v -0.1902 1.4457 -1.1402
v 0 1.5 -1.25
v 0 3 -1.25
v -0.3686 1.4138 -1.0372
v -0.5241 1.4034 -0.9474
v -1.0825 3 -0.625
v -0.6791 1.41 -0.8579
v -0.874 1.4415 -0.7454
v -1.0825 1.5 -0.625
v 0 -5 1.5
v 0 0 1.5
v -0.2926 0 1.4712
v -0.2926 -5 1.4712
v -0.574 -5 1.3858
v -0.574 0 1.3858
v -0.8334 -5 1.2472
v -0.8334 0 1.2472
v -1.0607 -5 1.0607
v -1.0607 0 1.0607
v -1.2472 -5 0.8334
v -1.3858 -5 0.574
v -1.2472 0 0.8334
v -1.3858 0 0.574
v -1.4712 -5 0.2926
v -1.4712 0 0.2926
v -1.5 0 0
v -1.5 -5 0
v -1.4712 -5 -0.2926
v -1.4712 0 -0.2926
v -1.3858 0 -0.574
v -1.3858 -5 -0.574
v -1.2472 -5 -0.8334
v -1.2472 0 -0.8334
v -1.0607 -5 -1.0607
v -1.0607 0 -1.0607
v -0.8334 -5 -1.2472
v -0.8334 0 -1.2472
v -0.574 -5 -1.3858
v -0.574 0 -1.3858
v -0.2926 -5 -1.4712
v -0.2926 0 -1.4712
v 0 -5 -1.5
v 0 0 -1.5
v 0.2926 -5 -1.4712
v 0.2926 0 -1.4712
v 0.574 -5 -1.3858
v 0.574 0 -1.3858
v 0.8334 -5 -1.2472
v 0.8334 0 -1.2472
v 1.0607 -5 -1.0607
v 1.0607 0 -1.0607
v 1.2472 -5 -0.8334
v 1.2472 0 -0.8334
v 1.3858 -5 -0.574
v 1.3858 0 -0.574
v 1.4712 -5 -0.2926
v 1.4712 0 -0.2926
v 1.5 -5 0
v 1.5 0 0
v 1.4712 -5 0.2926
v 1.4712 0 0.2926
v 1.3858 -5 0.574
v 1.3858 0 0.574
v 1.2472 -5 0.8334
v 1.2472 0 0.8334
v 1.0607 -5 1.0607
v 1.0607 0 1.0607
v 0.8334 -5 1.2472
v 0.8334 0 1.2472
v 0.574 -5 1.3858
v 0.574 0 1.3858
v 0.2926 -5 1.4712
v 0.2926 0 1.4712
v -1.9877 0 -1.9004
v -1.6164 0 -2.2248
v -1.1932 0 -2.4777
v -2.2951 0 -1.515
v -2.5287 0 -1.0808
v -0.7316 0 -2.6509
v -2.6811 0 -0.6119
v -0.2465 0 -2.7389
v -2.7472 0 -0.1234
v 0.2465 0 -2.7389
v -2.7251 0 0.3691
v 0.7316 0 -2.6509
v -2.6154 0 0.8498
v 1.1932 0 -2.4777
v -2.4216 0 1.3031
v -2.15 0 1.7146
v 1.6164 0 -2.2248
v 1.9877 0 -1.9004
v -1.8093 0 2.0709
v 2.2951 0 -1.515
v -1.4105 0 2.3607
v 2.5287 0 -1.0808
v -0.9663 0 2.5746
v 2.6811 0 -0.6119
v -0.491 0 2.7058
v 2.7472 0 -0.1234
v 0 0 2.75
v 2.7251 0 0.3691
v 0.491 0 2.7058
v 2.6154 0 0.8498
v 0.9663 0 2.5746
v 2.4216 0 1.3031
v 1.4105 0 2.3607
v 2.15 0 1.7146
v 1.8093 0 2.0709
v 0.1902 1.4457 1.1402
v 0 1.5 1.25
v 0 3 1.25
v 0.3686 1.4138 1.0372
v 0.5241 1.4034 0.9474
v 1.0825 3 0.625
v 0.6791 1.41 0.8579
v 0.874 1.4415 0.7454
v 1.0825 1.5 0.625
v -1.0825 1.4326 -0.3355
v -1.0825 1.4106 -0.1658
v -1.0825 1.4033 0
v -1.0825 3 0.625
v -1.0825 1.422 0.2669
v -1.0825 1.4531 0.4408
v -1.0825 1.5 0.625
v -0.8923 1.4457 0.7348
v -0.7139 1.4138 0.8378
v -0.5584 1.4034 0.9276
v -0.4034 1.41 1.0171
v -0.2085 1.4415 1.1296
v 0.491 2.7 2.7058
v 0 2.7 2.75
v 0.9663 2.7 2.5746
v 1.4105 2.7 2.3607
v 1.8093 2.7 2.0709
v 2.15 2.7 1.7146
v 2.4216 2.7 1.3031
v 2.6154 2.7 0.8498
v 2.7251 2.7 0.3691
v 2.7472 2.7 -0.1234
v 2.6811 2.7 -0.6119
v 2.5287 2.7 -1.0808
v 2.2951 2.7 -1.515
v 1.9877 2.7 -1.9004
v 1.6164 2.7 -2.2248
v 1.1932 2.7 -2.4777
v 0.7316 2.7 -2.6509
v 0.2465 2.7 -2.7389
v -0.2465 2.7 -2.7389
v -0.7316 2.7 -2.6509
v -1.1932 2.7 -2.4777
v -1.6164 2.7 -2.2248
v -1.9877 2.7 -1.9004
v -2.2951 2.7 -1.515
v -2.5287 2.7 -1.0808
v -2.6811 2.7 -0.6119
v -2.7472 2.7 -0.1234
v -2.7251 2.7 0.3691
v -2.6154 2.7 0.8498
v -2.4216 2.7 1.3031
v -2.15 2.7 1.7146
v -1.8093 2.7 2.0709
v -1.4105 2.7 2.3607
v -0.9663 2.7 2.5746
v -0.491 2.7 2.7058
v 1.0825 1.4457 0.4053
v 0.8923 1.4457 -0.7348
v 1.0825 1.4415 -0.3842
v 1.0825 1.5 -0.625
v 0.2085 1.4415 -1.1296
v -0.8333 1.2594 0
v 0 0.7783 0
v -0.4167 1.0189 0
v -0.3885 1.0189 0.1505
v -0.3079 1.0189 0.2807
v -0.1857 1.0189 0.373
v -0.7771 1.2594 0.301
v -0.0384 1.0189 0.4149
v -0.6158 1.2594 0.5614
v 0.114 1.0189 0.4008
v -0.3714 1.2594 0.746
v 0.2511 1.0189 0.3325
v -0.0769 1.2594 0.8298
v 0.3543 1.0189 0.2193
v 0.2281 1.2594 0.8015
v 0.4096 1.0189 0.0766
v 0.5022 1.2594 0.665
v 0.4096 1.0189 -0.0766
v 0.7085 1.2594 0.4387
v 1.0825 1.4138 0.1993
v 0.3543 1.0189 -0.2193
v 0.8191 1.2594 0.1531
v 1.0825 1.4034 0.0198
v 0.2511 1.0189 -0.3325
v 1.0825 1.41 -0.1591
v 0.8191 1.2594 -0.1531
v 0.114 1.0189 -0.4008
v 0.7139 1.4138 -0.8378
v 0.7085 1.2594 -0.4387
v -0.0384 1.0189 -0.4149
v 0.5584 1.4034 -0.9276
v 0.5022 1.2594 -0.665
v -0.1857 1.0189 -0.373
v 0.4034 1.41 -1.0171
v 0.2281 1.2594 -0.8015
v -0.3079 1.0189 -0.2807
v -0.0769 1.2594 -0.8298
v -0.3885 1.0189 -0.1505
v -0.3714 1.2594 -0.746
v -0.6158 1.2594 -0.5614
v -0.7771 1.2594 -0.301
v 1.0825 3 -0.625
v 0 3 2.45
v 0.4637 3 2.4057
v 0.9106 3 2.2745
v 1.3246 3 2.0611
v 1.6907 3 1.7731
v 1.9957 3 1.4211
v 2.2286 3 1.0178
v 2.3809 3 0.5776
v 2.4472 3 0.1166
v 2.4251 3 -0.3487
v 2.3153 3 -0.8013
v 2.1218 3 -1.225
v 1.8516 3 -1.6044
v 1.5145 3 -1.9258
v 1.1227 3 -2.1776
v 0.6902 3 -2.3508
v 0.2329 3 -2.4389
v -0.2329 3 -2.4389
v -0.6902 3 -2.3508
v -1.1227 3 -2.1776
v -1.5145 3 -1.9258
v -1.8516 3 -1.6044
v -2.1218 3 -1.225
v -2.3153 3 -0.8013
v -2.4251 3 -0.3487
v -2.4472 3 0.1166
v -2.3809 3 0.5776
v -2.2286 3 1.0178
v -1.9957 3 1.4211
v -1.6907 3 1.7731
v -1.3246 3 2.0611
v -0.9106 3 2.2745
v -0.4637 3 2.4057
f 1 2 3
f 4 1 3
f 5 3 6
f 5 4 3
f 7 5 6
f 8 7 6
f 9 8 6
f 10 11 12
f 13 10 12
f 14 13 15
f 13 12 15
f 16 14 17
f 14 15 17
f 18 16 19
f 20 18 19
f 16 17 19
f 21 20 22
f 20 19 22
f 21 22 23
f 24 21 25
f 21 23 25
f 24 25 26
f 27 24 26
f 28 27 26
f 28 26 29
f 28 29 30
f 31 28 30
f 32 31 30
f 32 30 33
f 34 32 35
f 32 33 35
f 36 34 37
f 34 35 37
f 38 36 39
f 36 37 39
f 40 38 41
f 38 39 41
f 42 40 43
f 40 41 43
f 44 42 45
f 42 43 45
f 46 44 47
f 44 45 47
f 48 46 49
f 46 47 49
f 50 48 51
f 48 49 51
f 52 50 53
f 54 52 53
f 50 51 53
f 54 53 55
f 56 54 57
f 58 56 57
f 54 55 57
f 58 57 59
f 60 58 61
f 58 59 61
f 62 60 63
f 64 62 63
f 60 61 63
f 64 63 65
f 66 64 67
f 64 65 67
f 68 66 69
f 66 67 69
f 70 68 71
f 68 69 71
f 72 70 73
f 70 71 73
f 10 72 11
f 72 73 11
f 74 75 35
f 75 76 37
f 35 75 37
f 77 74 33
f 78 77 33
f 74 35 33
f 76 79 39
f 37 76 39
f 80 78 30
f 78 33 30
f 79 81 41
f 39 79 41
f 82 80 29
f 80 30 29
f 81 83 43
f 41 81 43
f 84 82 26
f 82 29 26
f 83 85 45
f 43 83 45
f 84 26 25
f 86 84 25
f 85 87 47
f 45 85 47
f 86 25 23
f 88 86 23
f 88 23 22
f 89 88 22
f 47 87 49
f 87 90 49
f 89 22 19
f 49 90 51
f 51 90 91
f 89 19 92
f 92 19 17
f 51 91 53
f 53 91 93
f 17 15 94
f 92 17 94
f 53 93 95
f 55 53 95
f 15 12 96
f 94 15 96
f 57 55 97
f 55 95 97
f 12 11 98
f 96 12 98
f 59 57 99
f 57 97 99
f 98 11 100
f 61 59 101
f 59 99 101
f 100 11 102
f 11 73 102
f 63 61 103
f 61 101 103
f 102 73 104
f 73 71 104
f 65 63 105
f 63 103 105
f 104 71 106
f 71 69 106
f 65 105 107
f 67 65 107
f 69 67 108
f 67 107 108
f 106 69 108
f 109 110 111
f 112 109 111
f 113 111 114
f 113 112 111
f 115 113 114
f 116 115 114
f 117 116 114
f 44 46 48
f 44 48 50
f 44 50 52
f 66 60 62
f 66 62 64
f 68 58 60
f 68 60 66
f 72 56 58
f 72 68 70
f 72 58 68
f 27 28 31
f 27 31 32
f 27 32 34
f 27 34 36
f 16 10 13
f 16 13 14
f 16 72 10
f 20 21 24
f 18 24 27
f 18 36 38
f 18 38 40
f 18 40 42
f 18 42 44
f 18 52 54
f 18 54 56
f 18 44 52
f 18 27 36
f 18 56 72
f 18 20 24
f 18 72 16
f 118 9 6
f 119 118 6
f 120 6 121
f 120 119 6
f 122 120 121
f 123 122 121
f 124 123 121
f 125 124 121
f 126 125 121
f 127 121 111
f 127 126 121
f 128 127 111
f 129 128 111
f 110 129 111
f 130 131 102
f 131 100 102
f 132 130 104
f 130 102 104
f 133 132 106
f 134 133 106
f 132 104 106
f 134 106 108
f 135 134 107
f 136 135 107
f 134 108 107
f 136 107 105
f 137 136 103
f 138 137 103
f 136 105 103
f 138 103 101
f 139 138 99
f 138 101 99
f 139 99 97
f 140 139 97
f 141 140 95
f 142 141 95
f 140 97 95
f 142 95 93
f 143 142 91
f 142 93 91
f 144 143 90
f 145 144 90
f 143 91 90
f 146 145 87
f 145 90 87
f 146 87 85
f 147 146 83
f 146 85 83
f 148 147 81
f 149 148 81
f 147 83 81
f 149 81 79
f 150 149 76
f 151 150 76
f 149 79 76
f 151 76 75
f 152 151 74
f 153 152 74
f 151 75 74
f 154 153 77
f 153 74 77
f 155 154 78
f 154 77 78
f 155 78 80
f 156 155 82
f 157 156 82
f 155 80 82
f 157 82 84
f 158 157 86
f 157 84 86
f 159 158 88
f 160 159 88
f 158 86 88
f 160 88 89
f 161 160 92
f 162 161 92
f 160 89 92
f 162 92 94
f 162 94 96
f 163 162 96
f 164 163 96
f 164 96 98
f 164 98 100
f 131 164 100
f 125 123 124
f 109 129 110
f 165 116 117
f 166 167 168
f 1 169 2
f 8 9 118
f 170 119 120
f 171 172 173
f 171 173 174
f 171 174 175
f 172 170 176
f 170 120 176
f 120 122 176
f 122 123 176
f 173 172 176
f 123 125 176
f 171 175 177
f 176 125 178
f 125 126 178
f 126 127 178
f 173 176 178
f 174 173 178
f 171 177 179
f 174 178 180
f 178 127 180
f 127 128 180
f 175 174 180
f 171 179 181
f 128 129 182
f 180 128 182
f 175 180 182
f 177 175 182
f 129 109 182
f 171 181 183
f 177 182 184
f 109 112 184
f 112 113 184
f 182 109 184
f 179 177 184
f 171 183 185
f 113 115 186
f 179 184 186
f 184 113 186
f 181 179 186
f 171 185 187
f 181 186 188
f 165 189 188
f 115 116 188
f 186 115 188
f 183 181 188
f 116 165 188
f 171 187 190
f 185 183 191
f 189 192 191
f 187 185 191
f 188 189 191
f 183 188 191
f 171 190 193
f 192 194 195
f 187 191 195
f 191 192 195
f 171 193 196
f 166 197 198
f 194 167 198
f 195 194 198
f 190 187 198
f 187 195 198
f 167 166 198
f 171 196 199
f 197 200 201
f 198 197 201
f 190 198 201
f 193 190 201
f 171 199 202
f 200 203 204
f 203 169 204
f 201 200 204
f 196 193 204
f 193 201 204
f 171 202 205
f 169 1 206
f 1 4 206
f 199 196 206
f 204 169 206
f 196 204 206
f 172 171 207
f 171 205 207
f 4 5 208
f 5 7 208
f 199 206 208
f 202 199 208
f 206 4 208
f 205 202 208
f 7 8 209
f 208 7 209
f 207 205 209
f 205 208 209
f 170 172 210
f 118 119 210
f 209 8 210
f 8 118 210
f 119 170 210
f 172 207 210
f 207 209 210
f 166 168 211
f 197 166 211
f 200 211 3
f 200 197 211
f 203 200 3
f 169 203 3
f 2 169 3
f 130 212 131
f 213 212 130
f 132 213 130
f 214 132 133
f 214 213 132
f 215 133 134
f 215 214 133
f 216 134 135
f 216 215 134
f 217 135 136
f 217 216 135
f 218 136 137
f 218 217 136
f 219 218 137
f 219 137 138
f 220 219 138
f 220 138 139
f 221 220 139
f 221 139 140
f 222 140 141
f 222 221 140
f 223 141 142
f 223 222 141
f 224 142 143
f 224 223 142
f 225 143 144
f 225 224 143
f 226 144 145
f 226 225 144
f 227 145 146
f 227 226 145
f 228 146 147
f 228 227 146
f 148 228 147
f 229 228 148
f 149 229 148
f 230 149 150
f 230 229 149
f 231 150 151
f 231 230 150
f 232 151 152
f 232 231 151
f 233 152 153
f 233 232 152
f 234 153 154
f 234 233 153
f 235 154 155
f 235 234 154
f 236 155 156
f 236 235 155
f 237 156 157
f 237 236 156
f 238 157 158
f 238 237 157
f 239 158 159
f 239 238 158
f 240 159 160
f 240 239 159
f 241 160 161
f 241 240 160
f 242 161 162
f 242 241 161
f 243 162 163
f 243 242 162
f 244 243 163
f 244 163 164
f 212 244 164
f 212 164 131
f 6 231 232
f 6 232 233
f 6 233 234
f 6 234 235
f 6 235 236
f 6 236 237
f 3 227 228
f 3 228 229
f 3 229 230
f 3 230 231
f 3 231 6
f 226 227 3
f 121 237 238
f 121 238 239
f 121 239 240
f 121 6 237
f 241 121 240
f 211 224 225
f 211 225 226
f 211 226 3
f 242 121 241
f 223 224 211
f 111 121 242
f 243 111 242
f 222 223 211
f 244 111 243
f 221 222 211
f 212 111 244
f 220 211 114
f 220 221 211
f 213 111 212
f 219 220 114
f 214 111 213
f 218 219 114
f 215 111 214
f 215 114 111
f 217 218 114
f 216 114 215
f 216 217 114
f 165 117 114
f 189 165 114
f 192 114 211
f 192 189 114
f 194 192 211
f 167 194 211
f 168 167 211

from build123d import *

# Parameters (mm, degrees)
CROQUIS4_R              = 2.75
SALIENTE_EXTRUIR3_DEPTH = 3
CHAFL_N2_SIZE           = 0.3
CROQUIS6_R              = 1.5
SALIENTE_EXTRUIR4_DEPTH = 5


with BuildPart() as part:
    # Croquis4 → Saliente-Extruir3 (new body)
    with BuildSketch(Plane(origin=(0, 0, 0), x_dir=(1, 0, 0), z_dir=(0, 1, 0))):
        Circle(CROQUIS4_R)
        Polygon((0, 1.25), (-1.082531755, 0.625), (-1.082531755, -0.625), (0, -1.25), (1.082531755, -0.625), (1.082531755, 0.625), align=None, mode=Mode.SUBTRACT)
    extrude(amount=SALIENTE_EXTRUIR3_DEPTH)

    # Chaflán2
    chafl_n2_edges = [part.edges().sort_by_distance(p)[0] for p in [
        (-2.75, 3, 0),
    ]]
    chamfer(chafl_n2_edges, length=CHAFL_N2_SIZE)

    # Croquis5 → Revolución2 (revolve)
    with BuildSketch(Plane.XY):
        Polygon((0, 0), (0, 0.778312164), (1.25, 1.5), (2.75, 1.5), (2.75, 0), align=None)
    revolve(axis=Axis((0, 0, 0), (0, 1, 0)))

    # Croquis6 → Saliente-Extruir4 (add)
    with BuildSketch(Plane.XZ):
        Circle(CROQUIS6_R)
    extrude(amount=SALIENTE_EXTRUIR4_DEPTH)


solid = part.part
